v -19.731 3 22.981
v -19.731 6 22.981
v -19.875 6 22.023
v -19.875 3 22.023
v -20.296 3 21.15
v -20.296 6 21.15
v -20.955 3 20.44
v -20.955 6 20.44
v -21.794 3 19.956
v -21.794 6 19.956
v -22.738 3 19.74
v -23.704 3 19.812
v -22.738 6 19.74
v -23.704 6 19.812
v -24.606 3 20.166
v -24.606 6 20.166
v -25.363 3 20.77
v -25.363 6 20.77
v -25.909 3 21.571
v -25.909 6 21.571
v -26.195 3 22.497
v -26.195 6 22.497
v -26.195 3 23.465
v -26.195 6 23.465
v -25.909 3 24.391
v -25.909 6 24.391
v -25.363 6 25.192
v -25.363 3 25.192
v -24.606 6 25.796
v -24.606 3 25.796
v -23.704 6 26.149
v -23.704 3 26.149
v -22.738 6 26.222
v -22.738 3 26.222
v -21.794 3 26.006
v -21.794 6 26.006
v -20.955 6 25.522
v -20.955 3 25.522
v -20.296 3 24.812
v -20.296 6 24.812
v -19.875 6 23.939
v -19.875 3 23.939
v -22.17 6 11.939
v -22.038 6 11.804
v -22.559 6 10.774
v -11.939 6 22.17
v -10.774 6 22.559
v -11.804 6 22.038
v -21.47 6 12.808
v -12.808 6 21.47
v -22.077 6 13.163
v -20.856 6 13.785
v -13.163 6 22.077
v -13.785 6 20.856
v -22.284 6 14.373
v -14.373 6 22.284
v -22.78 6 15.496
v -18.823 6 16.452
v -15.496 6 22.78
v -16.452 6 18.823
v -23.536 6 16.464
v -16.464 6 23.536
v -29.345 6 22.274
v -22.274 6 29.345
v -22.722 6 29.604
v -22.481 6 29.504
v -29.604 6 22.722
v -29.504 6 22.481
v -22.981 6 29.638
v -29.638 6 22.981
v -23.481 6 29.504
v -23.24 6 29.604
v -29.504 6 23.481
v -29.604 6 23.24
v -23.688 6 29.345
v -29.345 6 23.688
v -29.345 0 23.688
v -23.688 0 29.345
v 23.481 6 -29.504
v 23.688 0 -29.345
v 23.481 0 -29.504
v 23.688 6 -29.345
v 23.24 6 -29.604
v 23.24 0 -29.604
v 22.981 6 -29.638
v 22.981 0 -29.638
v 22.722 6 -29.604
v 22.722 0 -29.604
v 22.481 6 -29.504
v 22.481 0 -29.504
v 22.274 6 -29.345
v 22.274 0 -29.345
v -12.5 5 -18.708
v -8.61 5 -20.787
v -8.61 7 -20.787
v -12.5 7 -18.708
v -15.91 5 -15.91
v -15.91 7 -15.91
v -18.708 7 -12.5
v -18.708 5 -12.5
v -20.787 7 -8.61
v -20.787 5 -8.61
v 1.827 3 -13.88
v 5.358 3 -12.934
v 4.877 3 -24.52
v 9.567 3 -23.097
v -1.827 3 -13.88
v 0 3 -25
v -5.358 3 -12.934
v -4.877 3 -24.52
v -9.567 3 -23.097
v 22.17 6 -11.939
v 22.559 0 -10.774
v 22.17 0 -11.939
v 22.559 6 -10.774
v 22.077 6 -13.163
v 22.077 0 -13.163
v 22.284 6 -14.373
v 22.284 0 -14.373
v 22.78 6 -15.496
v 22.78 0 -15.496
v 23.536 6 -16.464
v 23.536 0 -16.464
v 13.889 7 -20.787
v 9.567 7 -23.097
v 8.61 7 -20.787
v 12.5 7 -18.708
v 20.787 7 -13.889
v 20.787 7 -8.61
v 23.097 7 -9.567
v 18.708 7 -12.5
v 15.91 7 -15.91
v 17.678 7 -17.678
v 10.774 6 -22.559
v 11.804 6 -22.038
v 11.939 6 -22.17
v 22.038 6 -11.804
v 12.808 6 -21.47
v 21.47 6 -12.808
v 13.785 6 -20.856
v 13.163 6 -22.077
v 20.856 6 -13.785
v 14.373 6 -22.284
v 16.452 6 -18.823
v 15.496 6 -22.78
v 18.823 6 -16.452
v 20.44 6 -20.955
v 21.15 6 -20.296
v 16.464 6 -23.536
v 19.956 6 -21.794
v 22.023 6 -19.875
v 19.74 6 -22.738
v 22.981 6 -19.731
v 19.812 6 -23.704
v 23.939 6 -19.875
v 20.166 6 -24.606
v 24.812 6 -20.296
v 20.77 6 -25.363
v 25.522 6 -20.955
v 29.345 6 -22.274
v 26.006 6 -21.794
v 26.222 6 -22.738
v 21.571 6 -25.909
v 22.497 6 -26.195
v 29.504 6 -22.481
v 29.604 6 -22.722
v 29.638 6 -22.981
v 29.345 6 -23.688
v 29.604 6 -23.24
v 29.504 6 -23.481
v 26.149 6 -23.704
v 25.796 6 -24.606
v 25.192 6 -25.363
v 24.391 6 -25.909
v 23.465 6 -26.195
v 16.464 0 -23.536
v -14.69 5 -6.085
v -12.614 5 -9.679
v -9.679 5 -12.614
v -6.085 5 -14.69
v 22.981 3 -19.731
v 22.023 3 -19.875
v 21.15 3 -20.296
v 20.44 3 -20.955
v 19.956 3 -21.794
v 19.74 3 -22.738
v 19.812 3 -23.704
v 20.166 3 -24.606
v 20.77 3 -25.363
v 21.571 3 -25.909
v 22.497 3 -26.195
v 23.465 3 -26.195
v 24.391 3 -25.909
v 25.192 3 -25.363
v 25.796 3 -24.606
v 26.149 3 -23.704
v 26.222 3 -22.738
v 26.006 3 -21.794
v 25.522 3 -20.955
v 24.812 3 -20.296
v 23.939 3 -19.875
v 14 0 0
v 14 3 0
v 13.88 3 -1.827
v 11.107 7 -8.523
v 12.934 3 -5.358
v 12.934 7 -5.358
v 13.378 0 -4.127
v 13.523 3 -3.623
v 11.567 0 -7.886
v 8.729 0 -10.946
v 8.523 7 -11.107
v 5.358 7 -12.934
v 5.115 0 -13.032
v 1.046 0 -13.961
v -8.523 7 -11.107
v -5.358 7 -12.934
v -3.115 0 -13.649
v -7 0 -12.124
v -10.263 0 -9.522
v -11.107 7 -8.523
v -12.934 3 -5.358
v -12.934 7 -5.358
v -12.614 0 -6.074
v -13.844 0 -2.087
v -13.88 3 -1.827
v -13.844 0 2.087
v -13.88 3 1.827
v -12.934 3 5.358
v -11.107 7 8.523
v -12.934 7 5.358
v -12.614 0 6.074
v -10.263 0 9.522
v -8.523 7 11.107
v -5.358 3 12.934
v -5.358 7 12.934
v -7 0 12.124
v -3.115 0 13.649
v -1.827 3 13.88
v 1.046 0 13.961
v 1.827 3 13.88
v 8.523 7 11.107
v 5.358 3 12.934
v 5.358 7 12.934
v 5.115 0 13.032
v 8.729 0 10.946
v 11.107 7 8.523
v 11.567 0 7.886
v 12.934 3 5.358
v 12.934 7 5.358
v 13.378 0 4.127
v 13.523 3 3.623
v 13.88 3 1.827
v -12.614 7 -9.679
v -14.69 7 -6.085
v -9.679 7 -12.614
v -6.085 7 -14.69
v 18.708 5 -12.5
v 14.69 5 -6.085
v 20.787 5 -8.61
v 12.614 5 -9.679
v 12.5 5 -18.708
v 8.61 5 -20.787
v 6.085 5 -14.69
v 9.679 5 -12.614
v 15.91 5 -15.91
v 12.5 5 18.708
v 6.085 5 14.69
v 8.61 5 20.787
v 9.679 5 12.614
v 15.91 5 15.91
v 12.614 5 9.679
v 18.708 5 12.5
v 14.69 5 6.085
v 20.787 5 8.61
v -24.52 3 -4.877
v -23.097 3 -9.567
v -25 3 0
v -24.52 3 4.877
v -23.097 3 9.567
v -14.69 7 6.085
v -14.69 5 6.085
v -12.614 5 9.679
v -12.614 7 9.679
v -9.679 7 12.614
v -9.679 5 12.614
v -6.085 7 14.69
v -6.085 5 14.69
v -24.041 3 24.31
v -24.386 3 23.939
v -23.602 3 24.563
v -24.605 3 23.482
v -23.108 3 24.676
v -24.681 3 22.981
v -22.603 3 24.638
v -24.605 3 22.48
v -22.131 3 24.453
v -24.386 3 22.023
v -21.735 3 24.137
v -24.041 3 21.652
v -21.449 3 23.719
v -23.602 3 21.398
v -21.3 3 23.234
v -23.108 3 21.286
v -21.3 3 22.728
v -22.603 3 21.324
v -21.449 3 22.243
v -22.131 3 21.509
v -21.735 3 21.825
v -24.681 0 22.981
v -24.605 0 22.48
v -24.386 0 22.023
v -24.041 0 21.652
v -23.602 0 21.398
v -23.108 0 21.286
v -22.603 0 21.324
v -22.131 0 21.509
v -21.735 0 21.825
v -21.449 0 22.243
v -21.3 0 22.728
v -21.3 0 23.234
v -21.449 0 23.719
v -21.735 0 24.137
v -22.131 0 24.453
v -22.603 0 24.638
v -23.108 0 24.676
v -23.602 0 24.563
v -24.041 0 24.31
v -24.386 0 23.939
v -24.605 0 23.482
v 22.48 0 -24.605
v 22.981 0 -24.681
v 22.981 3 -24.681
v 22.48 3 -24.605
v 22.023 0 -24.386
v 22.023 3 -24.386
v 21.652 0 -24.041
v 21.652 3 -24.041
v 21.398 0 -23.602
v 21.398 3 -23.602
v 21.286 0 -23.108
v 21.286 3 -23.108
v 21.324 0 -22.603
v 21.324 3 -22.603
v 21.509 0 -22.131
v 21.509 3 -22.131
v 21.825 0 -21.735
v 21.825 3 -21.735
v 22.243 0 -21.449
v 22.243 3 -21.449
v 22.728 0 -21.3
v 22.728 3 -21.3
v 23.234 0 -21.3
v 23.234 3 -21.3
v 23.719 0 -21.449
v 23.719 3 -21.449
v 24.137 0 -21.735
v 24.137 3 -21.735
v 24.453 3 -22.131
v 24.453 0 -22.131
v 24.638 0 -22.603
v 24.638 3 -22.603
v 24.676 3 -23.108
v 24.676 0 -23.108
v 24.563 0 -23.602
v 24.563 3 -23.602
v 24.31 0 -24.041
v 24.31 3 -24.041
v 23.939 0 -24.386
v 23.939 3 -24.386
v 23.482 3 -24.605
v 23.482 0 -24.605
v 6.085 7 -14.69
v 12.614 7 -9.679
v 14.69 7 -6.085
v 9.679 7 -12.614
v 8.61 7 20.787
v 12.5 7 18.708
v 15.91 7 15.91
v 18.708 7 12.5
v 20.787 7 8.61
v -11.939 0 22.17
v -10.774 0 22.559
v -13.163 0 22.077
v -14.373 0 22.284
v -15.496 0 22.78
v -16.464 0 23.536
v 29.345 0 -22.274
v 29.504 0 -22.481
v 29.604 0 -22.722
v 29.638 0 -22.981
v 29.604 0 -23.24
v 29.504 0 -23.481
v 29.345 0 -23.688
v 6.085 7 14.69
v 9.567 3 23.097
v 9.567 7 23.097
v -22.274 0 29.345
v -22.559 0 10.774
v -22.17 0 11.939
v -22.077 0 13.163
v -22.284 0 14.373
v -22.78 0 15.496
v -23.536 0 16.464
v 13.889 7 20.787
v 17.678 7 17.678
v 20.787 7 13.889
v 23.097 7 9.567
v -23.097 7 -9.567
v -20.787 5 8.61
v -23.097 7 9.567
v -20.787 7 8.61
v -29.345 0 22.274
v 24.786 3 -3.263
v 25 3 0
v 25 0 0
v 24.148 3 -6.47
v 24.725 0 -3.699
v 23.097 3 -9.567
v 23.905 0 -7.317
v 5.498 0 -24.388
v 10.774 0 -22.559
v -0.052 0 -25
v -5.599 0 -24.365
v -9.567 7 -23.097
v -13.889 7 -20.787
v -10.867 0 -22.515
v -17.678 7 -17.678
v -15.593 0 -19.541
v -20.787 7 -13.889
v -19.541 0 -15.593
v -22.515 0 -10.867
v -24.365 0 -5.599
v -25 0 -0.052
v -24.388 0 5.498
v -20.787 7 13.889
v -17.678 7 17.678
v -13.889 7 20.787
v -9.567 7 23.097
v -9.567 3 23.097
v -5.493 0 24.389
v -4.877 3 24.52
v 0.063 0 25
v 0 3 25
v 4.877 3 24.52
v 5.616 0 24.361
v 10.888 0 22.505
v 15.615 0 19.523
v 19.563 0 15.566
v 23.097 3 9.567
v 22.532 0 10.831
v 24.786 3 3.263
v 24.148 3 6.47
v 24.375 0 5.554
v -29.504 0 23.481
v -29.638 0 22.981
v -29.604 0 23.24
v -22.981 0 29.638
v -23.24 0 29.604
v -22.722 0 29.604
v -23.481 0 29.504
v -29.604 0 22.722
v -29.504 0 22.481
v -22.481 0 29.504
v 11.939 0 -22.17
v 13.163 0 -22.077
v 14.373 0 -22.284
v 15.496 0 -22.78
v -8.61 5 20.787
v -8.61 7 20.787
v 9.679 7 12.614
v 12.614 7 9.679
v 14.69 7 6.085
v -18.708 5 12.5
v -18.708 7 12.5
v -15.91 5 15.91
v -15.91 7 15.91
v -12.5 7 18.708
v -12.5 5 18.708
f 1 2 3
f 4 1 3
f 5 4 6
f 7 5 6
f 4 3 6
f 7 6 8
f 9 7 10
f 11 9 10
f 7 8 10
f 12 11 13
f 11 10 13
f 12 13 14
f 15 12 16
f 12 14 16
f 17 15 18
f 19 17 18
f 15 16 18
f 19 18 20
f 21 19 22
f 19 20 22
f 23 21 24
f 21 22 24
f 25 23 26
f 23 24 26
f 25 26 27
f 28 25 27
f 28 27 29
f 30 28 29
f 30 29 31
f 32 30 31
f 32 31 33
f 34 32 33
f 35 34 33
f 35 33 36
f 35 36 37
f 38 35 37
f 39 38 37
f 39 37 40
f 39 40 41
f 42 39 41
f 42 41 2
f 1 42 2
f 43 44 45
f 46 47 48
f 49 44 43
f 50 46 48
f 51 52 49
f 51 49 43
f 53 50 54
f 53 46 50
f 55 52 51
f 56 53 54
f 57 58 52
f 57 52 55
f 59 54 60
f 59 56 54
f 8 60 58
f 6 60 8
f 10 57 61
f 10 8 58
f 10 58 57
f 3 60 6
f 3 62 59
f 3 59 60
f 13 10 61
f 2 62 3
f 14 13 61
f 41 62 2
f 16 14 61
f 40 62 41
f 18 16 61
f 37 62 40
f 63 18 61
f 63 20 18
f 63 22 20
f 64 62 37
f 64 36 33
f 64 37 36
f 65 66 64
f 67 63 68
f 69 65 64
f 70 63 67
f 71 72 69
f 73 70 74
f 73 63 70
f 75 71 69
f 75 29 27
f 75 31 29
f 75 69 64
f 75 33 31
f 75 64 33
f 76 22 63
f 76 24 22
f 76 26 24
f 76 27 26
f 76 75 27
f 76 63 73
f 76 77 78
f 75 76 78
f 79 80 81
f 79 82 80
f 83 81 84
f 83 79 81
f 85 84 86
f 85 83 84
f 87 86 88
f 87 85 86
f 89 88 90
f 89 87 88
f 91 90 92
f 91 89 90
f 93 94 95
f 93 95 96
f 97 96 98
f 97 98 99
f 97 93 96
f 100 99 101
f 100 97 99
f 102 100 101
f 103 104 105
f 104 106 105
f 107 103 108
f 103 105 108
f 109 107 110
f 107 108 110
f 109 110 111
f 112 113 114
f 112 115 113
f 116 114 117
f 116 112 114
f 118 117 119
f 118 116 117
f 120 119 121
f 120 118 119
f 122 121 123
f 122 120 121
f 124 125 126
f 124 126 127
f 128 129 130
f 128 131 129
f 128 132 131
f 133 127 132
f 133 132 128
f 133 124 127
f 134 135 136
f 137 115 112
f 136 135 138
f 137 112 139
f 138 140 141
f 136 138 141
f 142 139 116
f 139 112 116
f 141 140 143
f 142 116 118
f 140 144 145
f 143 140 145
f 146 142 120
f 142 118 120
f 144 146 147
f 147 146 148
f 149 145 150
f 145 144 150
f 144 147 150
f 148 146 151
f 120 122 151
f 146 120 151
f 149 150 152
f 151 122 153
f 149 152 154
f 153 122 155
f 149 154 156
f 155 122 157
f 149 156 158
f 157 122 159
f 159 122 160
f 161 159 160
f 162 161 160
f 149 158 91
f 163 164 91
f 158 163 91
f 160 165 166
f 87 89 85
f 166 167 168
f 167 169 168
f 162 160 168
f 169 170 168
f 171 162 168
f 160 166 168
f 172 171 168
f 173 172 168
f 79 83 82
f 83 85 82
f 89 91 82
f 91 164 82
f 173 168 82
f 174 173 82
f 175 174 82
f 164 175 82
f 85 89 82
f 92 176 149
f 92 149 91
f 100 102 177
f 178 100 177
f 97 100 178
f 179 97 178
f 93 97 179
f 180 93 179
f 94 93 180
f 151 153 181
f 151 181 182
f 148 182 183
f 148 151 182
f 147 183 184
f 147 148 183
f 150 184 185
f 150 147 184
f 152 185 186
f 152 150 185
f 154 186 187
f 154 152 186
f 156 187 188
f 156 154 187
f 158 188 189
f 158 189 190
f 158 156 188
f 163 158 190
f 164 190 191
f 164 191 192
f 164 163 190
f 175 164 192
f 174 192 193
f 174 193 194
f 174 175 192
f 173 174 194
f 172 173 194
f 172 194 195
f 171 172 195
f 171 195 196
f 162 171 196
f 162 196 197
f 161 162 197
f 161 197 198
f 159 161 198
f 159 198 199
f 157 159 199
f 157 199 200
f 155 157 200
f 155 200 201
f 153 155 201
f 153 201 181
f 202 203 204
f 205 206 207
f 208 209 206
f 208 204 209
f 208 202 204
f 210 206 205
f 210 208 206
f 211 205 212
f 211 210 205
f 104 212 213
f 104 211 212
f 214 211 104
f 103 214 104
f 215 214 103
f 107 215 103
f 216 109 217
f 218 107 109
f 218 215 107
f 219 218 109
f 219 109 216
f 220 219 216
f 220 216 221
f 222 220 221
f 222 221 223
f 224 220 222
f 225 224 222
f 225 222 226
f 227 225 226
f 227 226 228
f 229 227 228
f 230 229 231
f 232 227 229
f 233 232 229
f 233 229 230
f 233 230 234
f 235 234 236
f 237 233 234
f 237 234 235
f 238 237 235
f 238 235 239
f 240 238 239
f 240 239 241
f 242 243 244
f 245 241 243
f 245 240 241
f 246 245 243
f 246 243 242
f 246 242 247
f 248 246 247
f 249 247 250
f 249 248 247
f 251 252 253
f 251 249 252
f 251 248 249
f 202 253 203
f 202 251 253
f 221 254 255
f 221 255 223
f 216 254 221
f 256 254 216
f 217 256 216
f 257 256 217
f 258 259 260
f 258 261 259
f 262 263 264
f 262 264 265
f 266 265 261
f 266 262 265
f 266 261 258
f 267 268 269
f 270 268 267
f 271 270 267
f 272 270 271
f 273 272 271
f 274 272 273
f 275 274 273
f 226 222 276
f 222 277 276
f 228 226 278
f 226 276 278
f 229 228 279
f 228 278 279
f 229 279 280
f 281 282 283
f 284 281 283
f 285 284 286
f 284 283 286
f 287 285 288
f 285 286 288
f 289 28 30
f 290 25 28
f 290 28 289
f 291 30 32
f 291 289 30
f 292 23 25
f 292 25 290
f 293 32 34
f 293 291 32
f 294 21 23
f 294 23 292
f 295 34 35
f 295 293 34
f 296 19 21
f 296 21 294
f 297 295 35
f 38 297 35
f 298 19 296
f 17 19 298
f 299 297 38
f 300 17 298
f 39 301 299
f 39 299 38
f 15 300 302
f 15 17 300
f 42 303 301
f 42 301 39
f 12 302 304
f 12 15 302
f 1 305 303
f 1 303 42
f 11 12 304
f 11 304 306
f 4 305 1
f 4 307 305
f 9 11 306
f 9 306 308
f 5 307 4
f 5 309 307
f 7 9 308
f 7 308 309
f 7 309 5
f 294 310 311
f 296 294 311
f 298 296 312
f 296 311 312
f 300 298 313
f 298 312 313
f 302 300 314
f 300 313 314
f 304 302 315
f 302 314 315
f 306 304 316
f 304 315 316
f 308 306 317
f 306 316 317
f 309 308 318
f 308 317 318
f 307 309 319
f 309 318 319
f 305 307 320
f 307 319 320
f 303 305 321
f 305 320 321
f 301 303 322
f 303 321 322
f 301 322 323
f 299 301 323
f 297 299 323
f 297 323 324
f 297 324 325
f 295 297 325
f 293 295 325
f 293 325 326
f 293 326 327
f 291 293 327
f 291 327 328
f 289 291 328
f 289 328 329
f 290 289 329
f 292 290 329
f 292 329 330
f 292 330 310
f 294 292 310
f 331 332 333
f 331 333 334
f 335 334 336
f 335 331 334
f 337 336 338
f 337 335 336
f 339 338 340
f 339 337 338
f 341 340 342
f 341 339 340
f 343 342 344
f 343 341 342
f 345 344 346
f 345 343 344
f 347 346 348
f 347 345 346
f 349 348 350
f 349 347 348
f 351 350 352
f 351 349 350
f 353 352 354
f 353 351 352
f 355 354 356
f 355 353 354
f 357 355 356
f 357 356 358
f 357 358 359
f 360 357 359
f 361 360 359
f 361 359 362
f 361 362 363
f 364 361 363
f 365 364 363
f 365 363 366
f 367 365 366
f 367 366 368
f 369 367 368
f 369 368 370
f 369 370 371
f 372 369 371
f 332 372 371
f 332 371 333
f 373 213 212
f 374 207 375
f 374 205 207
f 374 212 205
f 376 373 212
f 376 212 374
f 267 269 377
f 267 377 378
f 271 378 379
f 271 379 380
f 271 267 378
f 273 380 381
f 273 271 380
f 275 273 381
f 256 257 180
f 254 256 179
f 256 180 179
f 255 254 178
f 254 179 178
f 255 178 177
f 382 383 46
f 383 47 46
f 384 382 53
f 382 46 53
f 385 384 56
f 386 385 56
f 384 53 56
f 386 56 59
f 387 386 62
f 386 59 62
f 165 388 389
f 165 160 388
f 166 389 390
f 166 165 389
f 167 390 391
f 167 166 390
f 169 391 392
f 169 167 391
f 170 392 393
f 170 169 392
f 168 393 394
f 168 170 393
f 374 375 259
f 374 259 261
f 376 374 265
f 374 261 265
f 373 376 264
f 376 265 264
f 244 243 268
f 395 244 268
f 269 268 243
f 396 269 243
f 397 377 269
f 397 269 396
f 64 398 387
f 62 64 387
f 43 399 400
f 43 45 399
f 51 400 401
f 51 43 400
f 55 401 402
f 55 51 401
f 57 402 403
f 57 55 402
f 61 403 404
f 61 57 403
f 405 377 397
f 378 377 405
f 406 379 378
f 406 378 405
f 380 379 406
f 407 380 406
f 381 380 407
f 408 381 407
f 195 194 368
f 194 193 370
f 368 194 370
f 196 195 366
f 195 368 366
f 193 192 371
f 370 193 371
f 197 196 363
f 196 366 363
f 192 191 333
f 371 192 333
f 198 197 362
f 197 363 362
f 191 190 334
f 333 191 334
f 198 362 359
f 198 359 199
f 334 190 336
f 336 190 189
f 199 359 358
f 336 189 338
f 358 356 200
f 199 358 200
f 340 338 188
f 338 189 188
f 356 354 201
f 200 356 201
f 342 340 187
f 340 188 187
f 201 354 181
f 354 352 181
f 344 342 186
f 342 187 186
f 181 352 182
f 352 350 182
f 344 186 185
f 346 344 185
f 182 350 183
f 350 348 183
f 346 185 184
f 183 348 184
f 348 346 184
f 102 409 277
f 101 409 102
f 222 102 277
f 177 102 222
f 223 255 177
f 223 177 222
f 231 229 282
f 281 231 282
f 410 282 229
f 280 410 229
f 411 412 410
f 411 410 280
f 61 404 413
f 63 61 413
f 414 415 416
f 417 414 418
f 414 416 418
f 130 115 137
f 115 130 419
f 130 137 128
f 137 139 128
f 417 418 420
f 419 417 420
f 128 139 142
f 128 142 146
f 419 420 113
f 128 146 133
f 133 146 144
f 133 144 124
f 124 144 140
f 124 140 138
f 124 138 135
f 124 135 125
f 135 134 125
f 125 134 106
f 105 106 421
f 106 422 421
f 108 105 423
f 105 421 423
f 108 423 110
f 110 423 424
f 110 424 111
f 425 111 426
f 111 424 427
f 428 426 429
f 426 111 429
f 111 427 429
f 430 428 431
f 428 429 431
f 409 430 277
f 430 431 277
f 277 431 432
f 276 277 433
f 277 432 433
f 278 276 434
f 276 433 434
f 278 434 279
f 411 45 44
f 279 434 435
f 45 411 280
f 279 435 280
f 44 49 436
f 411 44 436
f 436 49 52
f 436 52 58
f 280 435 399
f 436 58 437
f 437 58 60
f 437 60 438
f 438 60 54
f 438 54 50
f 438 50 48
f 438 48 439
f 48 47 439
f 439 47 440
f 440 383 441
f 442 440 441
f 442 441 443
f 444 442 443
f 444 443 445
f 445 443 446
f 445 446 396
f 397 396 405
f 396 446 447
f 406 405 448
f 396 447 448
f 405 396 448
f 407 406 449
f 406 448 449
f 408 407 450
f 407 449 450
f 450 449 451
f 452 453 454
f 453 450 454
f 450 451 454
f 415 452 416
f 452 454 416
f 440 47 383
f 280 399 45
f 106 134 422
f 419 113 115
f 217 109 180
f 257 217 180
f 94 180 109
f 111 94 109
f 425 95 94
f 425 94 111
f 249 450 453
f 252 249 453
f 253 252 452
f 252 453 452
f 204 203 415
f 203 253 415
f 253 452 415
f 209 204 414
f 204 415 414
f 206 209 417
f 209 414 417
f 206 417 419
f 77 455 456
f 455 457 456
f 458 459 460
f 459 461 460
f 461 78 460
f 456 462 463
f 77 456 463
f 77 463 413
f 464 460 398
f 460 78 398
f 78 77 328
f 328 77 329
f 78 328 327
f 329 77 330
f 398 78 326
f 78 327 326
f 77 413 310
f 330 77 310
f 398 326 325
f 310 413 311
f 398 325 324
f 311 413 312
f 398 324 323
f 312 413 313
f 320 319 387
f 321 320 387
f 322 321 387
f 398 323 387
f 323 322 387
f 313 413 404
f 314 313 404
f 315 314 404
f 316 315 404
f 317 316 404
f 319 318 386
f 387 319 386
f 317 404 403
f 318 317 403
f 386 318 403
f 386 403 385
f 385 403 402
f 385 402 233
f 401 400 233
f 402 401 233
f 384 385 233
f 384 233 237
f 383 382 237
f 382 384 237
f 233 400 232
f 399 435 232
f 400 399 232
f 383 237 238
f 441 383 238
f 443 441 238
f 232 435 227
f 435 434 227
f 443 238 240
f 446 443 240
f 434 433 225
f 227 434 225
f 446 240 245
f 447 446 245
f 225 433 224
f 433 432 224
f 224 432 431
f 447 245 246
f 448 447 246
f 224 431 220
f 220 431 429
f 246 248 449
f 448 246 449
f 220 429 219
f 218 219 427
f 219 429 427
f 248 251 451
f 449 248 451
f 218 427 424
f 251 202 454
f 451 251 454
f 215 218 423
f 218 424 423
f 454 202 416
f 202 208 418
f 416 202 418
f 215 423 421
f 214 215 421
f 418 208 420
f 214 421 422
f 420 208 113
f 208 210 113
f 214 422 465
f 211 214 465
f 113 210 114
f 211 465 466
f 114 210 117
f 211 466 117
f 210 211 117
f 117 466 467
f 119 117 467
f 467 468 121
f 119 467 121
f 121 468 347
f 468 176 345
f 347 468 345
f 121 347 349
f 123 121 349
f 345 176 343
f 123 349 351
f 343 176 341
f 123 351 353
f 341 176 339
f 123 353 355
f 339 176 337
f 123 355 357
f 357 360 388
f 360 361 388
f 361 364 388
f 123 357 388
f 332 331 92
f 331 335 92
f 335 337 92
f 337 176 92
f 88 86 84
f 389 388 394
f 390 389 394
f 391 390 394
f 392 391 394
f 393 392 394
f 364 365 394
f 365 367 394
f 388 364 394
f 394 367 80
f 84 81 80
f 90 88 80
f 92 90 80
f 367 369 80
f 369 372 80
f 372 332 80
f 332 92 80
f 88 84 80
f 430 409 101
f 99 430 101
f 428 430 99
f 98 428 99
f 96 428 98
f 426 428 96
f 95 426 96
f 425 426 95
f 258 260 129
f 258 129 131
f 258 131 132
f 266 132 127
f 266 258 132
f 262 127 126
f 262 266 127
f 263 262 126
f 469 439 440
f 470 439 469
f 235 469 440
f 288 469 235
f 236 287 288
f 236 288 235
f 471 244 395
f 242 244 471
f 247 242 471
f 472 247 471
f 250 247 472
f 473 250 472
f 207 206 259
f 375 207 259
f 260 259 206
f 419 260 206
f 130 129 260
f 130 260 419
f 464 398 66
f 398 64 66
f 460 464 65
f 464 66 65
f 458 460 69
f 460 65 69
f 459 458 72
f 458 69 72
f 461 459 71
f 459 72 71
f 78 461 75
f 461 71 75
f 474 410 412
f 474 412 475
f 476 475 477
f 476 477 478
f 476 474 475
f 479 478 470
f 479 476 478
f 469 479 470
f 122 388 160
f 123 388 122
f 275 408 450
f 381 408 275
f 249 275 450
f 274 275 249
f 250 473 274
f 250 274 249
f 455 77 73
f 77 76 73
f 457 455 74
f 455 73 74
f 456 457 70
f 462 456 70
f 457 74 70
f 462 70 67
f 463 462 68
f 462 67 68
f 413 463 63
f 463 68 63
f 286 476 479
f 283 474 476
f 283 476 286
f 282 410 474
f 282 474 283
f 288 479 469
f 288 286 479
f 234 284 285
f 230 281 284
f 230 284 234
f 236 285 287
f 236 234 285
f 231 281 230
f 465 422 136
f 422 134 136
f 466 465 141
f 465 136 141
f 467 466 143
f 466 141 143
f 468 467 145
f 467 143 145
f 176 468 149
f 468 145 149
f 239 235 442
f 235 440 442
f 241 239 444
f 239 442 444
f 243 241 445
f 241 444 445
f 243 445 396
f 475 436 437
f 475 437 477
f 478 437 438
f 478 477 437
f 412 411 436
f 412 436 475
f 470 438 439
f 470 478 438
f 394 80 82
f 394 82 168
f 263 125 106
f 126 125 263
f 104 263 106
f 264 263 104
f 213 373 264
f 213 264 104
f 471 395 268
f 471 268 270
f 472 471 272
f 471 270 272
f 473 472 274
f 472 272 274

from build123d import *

# Parameters (mm, degrees)
SKETCH1_R                      = 25
SKETCH1_R_2                    = 14
BOSS_EXTRUDE1_DEPTH            = 5
SKETCH3_R                      = 25
SKETCH3_R_2                    = 22.5
BOSS_EXTRUDE2_DEPTH            = 2
SKETCH5_R                      = 15.9
SKETCH5_R_2                    = 14
BOSS_EXTRUDE3_DEPTH            = 2
CUT_EXTRUDE1_DEPTH             = 4
CIRPATTERN1_COUNT              = 4
BOSS_EXTRUDE4_DEPTH            = 6
CBORE_FOR_M3_SHCS1_D           = 3.4
CBORE_FOR_M3_SHCS1_DEPTH       = 6
CBORE_FOR_M3_SHCS1_CBORE_D     = 6.5
CBORE_FOR_M3_SHCS1_CBORE_DEPTH = 3
FILLET1_R                      = 5
FILLET1_OF_MIRROR1_R           = 5
FILLET2_R                      = 1


with BuildPart() as part:
    # Sketch1 → Boss-Extrude1 (new body)
    with BuildSketch(Plane(origin=(0, 0, 0), x_dir=(1, 0, 0), z_dir=(0, 1, 0))):
        Circle(SKETCH1_R)
        Circle(SKETCH1_R_2, mode=Mode.SUBTRACT)
    extrude(amount=BOSS_EXTRUDE1_DEPTH)

    # Sketch3 → Boss-Extrude2 (add)
    with BuildSketch(Plane(origin=(0, 5, 0), x_dir=(1, 0, 0), z_dir=(0, 1, 0))):
        Circle(SKETCH3_R)
        Circle(SKETCH3_R_2, mode=Mode.SUBTRACT)
    extrude(amount=BOSS_EXTRUDE2_DEPTH)

    # Sketch5 → Boss-Extrude3 (add, through all)
    with BuildSketch(Plane(origin=(0, 5, 0), x_dir=(1, 0, 0), z_dir=(0, 1, 0))):
        Circle(SKETCH5_R)
        Circle(SKETCH5_R_2, mode=Mode.SUBTRACT)
    extrude(amount=BOSS_EXTRUDE3_DEPTH)

    # Sketch4 → Cut-Extrude1 (cut)
    with BuildSketch(Plane(origin=(0, 7, 0), x_dir=(1, 0, 0), z_dir=(0, 1, 0))):
        with BuildLine():
            Line((0, 0), (-9.567085809, 23.096988313))
            ThreePointArc((-9.567085809, 23.096988313), (0, 25), (9.567085809, 23.096988313))
            Line((9.567085809, 23.096988313), (0, 0))
        make_face()
    cut_extrude1 = extrude(amount=-CUT_EXTRUDE1_DEPTH, mode=Mode.SUBTRACT)

    # CirPattern1: Cut-Extrude1 ×4 about axis
    cirpattern1_axis = Axis((0, 7, 0), (0, -1, 0))
    for i in range(1, CIRPATTERN1_COUNT):
        add(cut_extrude1.rotate(cirpattern1_axis, i * 360 / CIRPATTERN1_COUNT), mode=Mode.SUBTRACT)

    # Sketch6 → Boss-Extrude4 (add)
    with BuildSketch(Plane.XZ):
        with BuildLine():
            Line((-30.0520382, 22.980970389), (-22.980970389, 30.0520382))
            Line((-22.980970389, 30.0520382), (-13.78497417, 20.856041982))
            ThreePointArc((-13.78497417, 20.856041982), (-17.67766953, 17.67766953), (-20.856041982, 13.78497417))
            Line((-20.856041982, 13.78497417), (-30.0520382, 22.980970389))
        make_face()
    boss_extrude4 = extrude(amount=-BOSS_EXTRUDE4_DEPTH)

    # CBORE for M3 SHCS1
    with Locations(Plane(origin=(0, 6, 0), x_dir=(1, 0, 0), z_dir=(0, 1, 0))):
        with Locations((-22.980970389, -22.980970389)):
            cbore_for_m3_shcs1 = CounterBoreHole(CBORE_FOR_M3_SHCS1_D / 2, CBORE_FOR_M3_SHCS1_CBORE_D / 2, CBORE_FOR_M3_SHCS1_CBORE_DEPTH, depth=CBORE_FOR_M3_SHCS1_DEPTH)

    # Fillet1
    fillet1_edges = [part.edges().sort_by_distance(p)[0] for p in [
        (-20.856041982, 3, 13.78497417),
        (-13.78497417, 3, 20.856041982),
    ]]
    fillet(fillet1_edges, radius=FILLET1_R)

    # Mirror1: Boss-Extrude4, CBORE for M3 SHCS1 across plane
    add(boss_extrude4.mirror(Plane(origin=(0, 0, 0), x_dir=(0.707106781, 0, 0.707106781), z_dir=(-0.707106781, 0, 0.707106781))))
    add(cbore_for_m3_shcs1.mirror(Plane(origin=(0, 0, 0), x_dir=(0.707106781, 0, 0.707106781), z_dir=(-0.707106781, 0, 0.707106781))), mode=Mode.SUBTRACT)

    # Fillet1 of Mirror1
    fillet1_of_mirror1_edges = [part.edges().sort_by_distance(p)[0] for p in [
        (13.78497417, 3, -20.856041982),
        (20.856041982, 3, -13.78497417),
    ]]
    fillet(fillet1_of_mirror1_edges, radius=FILLET1_OF_MIRROR1_R)

    # Fillet2
    fillet2_edges = [part.edges().sort_by_distance(p)[0] for p in [
        (-30.0520382, 3, 22.980970389),
        (-22.980970389, 3, 30.0520382),
        (22.980970389, 3, -30.0520382),
        (30.0520382, 3, -22.980970389),
    ]]
    fillet(fillet2_edges, radius=FILLET2_R)


solid = part.part
